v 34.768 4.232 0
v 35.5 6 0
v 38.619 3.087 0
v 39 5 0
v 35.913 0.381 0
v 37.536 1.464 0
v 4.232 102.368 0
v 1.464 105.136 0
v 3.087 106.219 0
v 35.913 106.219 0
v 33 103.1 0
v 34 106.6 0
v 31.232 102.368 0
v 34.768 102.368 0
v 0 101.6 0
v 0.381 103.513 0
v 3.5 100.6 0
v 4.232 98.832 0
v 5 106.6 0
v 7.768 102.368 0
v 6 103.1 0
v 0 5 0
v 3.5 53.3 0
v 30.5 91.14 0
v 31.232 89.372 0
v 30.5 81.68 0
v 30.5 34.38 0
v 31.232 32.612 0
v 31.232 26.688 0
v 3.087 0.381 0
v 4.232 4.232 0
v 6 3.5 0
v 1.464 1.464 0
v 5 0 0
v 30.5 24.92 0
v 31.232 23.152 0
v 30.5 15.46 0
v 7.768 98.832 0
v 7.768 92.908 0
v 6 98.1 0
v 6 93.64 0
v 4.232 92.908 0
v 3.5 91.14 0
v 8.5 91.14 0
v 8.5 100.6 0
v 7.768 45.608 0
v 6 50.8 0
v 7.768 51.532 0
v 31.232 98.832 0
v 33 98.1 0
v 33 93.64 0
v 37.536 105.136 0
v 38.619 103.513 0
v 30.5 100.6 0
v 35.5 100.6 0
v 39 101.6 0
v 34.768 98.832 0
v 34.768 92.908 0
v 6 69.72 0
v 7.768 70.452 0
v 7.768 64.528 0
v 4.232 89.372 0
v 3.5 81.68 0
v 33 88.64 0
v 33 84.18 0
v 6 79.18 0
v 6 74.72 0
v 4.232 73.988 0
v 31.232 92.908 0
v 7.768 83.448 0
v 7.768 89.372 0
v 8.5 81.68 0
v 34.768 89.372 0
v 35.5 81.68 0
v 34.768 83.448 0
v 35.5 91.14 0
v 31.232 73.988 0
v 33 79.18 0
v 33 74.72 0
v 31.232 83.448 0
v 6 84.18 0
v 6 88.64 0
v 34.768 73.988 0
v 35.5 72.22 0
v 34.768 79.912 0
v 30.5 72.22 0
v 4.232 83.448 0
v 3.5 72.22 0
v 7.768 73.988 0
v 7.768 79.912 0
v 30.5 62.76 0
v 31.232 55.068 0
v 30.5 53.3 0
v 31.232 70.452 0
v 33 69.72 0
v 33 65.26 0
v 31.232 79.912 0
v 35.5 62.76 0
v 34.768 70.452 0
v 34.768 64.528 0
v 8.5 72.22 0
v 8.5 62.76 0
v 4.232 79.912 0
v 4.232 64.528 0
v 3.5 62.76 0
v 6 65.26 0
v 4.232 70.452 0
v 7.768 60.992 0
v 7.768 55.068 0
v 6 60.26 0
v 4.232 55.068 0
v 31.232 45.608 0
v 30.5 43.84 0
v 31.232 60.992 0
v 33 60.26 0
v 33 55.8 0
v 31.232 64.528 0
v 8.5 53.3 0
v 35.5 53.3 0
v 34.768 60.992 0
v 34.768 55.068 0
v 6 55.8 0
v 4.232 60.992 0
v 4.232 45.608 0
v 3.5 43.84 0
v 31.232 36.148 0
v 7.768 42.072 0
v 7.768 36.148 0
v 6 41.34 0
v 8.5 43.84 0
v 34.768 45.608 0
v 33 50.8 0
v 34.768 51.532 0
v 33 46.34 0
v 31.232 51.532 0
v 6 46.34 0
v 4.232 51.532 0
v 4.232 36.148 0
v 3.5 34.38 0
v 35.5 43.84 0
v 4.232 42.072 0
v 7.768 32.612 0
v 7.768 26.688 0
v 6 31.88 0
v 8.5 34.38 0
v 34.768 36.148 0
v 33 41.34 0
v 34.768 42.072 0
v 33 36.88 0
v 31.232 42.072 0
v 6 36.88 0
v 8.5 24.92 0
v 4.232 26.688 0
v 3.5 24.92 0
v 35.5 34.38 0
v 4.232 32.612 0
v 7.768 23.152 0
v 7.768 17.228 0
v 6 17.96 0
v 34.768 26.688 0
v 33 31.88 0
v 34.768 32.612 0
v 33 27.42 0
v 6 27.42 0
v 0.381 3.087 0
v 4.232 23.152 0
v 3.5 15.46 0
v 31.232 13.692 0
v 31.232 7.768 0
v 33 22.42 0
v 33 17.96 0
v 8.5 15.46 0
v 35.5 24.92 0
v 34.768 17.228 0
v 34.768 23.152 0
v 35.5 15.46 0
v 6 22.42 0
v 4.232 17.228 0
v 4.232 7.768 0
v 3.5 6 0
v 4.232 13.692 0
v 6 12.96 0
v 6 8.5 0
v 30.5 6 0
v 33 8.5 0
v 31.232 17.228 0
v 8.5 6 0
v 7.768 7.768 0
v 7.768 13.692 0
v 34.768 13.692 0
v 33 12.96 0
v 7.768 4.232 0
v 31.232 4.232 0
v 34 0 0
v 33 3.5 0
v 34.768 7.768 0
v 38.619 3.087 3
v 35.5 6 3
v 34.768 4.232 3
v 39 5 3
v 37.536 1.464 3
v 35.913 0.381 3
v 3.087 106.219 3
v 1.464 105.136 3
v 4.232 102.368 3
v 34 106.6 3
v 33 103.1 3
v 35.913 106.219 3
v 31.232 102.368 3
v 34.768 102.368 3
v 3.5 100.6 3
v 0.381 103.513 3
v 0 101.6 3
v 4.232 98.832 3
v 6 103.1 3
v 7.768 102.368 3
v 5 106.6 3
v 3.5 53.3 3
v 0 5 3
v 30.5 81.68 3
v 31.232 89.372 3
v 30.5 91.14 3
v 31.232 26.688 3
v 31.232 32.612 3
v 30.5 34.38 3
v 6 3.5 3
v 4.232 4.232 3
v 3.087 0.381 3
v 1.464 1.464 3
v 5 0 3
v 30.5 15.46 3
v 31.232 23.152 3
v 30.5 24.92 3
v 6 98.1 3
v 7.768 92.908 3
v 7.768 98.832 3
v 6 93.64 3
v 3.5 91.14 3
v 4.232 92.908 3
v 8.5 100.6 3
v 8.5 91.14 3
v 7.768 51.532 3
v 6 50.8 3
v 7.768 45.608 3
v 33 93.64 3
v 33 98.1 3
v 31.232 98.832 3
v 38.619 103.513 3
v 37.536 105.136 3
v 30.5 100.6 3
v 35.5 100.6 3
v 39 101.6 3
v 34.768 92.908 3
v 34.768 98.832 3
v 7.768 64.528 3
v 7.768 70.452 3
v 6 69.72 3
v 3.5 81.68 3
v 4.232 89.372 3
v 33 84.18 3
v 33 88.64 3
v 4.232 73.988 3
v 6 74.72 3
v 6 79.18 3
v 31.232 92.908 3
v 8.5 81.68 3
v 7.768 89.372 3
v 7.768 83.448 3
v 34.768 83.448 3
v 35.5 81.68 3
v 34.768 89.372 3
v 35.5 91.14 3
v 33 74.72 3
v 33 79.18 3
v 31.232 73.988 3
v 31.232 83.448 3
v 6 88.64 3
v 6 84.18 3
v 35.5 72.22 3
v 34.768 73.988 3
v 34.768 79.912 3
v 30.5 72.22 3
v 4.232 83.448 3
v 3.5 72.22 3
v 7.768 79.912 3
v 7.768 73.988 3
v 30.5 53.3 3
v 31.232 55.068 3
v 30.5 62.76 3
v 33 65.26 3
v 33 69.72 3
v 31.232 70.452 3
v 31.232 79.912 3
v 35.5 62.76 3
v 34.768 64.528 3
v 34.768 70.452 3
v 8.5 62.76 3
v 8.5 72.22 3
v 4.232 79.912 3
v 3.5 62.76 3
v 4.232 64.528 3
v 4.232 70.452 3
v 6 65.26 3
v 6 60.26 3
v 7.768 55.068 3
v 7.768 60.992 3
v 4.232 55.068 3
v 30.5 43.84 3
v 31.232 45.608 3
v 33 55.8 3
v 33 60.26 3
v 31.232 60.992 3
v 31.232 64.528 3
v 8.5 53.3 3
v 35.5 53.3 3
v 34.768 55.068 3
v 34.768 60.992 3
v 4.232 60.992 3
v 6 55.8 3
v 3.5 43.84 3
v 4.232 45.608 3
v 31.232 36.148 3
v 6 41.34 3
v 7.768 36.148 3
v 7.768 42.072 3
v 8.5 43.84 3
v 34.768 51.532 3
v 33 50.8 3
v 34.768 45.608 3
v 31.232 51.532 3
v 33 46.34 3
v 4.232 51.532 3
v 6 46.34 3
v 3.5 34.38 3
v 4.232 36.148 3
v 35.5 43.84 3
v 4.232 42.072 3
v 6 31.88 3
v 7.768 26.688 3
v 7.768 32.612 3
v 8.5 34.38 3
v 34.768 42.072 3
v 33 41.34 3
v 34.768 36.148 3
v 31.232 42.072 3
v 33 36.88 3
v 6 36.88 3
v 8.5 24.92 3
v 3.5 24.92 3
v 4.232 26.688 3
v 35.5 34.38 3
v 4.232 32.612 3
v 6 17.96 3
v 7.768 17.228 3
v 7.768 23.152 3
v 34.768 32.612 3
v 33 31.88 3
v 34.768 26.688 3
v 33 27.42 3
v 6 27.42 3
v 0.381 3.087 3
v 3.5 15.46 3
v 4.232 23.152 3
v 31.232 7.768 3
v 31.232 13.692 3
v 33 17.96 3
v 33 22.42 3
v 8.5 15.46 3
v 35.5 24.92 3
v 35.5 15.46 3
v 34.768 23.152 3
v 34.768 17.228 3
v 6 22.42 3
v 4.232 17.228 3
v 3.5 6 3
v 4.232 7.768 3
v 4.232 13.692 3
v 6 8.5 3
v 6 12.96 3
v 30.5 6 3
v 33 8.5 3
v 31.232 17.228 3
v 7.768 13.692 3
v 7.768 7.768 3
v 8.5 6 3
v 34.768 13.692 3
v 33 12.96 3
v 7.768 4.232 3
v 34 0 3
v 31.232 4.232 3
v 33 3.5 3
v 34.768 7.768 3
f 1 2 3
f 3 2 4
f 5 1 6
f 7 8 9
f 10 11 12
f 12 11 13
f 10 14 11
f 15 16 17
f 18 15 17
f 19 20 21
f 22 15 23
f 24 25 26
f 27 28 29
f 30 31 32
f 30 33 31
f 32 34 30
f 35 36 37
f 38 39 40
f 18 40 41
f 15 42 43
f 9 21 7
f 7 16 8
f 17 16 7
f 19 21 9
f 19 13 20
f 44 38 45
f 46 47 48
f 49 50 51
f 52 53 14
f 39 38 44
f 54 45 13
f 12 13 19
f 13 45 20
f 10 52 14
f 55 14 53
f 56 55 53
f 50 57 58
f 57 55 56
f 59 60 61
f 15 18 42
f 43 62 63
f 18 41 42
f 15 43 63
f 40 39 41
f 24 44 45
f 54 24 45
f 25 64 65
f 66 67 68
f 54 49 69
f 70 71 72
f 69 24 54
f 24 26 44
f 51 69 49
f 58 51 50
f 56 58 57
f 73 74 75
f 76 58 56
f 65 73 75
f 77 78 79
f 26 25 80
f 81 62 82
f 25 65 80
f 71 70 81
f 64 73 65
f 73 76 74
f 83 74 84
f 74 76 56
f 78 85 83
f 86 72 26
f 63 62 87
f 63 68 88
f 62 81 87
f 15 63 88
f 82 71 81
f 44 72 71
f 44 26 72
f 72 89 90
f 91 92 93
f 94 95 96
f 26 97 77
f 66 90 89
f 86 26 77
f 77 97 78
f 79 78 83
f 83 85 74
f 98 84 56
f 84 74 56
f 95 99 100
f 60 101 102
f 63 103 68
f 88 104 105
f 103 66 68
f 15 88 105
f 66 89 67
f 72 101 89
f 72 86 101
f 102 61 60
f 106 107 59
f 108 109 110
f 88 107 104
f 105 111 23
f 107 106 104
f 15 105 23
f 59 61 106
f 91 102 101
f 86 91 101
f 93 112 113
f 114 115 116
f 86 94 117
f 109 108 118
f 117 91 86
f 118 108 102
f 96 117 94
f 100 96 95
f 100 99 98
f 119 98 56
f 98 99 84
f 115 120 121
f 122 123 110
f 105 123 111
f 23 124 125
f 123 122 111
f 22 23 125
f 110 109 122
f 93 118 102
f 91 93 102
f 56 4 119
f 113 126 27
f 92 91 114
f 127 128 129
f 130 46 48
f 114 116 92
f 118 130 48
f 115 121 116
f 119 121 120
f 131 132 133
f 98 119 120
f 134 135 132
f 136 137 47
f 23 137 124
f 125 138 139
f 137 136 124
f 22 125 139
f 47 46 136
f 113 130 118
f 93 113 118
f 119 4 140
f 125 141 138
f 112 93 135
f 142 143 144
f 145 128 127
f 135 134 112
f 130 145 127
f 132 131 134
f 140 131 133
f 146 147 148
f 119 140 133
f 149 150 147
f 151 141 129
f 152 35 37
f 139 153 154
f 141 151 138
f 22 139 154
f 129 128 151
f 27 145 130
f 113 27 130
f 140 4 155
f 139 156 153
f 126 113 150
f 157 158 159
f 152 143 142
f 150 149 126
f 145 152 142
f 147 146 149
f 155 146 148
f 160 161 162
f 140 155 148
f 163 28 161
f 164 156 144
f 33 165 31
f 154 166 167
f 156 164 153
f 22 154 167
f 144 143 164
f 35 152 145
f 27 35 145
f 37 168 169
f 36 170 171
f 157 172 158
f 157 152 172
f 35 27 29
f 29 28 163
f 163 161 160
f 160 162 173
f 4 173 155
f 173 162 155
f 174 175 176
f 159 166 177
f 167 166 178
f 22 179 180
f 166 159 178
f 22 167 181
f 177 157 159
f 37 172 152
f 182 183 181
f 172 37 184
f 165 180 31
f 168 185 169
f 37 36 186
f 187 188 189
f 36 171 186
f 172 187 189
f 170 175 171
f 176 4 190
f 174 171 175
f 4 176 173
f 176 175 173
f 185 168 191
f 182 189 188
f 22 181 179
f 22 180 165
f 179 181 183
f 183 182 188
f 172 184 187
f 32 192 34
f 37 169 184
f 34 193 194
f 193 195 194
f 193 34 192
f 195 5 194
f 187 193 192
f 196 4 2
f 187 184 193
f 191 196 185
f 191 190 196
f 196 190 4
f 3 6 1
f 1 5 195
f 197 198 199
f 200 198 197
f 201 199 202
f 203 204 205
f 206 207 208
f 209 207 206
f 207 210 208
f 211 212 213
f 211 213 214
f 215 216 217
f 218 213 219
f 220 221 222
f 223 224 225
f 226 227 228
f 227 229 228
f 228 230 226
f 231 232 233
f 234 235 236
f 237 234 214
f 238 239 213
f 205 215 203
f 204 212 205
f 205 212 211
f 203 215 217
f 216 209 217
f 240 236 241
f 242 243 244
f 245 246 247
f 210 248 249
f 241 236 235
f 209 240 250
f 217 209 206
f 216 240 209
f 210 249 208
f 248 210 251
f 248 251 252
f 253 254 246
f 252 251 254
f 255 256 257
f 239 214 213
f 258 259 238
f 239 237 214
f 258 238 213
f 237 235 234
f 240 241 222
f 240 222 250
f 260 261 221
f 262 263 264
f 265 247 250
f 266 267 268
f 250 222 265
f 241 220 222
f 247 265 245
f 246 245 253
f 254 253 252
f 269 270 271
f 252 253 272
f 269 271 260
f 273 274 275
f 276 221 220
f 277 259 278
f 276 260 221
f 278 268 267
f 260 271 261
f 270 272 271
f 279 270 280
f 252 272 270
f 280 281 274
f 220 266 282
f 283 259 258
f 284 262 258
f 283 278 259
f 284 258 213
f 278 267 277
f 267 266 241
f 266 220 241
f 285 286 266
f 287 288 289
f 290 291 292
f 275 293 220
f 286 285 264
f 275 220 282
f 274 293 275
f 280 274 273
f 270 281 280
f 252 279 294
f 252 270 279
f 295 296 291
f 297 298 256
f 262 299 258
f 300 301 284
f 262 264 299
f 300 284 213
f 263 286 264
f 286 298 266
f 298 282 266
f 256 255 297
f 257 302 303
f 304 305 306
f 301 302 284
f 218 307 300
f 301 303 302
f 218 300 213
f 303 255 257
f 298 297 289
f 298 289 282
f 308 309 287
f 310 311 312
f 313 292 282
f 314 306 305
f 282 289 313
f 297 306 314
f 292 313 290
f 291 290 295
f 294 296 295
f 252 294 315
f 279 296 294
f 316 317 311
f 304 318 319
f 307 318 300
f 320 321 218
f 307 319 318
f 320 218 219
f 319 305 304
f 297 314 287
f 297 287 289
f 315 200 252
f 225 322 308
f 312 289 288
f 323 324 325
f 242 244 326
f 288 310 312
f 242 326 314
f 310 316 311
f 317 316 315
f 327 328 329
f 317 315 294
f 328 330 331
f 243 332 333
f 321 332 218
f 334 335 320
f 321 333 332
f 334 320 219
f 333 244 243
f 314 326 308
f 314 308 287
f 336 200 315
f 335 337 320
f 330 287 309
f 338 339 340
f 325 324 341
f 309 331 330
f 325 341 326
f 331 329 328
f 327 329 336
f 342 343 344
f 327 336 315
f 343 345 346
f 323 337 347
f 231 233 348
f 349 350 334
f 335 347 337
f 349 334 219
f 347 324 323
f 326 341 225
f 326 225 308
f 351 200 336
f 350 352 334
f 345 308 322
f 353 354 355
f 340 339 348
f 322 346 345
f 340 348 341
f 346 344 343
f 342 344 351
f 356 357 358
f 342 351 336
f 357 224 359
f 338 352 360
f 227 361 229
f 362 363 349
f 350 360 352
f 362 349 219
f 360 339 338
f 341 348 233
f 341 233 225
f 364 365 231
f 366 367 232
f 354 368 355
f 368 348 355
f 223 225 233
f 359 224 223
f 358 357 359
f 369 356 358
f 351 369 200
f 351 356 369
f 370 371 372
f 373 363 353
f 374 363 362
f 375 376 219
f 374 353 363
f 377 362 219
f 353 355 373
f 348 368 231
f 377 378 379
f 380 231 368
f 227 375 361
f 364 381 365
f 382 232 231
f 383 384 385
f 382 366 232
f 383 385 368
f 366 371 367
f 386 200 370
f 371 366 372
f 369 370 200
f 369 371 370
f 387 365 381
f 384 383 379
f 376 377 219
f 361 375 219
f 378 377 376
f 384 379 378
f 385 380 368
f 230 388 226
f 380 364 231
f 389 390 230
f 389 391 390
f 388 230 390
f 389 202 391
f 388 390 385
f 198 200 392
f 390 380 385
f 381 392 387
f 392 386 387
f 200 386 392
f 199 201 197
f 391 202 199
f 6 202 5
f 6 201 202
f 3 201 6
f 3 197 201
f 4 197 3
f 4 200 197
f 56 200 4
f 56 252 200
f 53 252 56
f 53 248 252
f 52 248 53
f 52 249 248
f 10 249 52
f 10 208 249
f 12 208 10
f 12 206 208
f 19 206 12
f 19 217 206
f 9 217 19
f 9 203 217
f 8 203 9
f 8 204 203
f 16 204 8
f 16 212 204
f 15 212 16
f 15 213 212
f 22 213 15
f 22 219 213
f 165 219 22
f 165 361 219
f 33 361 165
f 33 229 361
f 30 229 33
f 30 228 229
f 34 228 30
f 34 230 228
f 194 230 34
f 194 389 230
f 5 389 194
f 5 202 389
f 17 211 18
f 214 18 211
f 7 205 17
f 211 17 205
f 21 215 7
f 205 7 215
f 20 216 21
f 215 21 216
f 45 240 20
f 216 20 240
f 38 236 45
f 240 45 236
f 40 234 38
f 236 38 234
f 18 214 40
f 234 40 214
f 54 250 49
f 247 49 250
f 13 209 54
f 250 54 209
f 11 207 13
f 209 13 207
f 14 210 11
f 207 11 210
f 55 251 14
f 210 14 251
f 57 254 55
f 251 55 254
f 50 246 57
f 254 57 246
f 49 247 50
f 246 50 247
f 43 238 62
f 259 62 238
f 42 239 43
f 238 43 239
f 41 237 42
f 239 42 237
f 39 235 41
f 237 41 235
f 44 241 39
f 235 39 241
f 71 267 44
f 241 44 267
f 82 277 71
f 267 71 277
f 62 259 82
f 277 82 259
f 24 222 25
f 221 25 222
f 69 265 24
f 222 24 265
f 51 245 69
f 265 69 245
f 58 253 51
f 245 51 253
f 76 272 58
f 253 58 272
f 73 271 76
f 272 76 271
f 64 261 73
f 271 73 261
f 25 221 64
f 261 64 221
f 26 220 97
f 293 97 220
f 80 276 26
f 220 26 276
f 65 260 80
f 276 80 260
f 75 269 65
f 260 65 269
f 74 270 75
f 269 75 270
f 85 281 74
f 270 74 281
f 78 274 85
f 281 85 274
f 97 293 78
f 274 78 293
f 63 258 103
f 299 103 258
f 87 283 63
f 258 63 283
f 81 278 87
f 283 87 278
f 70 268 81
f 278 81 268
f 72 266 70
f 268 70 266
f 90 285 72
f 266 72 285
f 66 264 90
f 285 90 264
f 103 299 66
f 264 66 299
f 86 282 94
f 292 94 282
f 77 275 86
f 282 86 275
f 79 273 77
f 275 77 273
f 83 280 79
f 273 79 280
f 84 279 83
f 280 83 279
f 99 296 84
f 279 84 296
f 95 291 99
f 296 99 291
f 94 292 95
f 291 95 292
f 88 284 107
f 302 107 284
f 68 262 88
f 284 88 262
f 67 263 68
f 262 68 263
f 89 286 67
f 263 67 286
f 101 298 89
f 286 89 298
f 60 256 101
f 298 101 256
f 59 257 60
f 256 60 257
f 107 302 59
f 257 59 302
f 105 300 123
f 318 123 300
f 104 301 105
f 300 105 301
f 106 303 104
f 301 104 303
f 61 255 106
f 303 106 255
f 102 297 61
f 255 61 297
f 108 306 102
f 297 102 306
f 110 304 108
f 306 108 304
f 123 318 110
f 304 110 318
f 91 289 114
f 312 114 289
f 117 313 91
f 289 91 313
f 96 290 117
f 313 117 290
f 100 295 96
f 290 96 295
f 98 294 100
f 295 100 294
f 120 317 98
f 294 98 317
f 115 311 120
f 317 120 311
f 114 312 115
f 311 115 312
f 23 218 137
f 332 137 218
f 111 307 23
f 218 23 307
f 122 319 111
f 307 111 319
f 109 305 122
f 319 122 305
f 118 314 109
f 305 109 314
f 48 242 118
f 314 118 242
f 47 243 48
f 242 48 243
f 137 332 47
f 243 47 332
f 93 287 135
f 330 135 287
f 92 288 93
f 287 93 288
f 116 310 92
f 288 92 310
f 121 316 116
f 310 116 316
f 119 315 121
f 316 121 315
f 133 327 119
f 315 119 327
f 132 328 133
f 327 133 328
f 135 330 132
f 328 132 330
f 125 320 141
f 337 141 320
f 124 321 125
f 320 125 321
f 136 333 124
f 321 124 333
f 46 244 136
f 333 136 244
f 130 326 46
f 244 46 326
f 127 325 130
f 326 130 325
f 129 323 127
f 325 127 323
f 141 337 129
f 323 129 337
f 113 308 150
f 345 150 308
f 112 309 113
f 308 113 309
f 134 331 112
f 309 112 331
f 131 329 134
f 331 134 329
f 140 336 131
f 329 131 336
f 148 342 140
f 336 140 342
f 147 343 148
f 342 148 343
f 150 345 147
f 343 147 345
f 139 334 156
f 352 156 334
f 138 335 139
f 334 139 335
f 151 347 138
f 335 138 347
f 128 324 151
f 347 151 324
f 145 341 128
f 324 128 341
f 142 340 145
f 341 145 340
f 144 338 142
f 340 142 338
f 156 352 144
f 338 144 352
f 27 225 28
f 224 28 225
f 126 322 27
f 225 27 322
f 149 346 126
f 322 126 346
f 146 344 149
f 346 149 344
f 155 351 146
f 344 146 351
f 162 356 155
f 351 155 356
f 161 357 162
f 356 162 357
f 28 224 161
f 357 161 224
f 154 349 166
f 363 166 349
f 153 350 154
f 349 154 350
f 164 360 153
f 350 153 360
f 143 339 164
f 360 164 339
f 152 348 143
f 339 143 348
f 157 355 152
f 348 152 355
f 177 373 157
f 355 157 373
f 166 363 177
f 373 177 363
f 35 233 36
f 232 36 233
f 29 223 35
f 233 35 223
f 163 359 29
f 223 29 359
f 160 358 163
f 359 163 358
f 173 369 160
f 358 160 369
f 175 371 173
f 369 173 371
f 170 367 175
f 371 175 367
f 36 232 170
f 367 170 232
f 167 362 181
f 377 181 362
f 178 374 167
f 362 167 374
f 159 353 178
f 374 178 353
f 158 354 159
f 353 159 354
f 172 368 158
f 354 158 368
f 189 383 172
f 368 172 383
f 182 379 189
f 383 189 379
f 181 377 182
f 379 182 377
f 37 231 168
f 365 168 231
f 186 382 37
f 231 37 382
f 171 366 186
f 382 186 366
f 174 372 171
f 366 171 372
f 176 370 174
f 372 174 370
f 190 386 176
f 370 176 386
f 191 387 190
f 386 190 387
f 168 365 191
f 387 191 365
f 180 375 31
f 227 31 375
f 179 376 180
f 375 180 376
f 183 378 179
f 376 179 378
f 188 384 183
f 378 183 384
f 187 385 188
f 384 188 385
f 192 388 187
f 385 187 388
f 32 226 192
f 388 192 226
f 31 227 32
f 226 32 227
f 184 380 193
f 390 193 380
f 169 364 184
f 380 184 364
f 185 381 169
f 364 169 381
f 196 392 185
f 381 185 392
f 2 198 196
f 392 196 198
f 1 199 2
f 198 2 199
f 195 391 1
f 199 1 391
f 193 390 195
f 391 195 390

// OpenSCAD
// Not yet tied into the main rack-mount plate, but this is a screw plate that can be used to mount other components to the rack-mount plate. 
// It has a grid of holes for screws.

//Width
sizex = 39;
//Length
sizey = 106.6;
thickness = 3;
//Distance between center of corner holes and the edge 
gapx = 6;
gapy = 6;
//Bolt hole diameter
boltsize = 5;
//Bolt count in X axis
boltsx = 2;
//Bolt count in Y axis
boltsy = 11;
//Corner radius
rounding = 5;

boltspreadx = sizex - 2*gapx;
boltspready = sizey - 2*gapy; //94.5
boltpitchx = boltspreadx / (boltsx - 1);
boltpitchy = boltspready / (boltsy - 1);

module slab(){
    translate([rounding, rounding]) minkowski(){
        circle(rounding);
        square([sizex - 2*rounding, sizey - 2*rounding]);
    }
}
module bolts(){
    for(i = [0:boltsx-1]) for(j = [0:boltsy-1])
    translate([gapx + i*boltpitchx, gapy + j*boltpitchy])
    circle(d = boltsize);
}
module plate(){
    difference(){
        slab(); bolts();
    }
}

linear_extrude(height = thickness) plate();
